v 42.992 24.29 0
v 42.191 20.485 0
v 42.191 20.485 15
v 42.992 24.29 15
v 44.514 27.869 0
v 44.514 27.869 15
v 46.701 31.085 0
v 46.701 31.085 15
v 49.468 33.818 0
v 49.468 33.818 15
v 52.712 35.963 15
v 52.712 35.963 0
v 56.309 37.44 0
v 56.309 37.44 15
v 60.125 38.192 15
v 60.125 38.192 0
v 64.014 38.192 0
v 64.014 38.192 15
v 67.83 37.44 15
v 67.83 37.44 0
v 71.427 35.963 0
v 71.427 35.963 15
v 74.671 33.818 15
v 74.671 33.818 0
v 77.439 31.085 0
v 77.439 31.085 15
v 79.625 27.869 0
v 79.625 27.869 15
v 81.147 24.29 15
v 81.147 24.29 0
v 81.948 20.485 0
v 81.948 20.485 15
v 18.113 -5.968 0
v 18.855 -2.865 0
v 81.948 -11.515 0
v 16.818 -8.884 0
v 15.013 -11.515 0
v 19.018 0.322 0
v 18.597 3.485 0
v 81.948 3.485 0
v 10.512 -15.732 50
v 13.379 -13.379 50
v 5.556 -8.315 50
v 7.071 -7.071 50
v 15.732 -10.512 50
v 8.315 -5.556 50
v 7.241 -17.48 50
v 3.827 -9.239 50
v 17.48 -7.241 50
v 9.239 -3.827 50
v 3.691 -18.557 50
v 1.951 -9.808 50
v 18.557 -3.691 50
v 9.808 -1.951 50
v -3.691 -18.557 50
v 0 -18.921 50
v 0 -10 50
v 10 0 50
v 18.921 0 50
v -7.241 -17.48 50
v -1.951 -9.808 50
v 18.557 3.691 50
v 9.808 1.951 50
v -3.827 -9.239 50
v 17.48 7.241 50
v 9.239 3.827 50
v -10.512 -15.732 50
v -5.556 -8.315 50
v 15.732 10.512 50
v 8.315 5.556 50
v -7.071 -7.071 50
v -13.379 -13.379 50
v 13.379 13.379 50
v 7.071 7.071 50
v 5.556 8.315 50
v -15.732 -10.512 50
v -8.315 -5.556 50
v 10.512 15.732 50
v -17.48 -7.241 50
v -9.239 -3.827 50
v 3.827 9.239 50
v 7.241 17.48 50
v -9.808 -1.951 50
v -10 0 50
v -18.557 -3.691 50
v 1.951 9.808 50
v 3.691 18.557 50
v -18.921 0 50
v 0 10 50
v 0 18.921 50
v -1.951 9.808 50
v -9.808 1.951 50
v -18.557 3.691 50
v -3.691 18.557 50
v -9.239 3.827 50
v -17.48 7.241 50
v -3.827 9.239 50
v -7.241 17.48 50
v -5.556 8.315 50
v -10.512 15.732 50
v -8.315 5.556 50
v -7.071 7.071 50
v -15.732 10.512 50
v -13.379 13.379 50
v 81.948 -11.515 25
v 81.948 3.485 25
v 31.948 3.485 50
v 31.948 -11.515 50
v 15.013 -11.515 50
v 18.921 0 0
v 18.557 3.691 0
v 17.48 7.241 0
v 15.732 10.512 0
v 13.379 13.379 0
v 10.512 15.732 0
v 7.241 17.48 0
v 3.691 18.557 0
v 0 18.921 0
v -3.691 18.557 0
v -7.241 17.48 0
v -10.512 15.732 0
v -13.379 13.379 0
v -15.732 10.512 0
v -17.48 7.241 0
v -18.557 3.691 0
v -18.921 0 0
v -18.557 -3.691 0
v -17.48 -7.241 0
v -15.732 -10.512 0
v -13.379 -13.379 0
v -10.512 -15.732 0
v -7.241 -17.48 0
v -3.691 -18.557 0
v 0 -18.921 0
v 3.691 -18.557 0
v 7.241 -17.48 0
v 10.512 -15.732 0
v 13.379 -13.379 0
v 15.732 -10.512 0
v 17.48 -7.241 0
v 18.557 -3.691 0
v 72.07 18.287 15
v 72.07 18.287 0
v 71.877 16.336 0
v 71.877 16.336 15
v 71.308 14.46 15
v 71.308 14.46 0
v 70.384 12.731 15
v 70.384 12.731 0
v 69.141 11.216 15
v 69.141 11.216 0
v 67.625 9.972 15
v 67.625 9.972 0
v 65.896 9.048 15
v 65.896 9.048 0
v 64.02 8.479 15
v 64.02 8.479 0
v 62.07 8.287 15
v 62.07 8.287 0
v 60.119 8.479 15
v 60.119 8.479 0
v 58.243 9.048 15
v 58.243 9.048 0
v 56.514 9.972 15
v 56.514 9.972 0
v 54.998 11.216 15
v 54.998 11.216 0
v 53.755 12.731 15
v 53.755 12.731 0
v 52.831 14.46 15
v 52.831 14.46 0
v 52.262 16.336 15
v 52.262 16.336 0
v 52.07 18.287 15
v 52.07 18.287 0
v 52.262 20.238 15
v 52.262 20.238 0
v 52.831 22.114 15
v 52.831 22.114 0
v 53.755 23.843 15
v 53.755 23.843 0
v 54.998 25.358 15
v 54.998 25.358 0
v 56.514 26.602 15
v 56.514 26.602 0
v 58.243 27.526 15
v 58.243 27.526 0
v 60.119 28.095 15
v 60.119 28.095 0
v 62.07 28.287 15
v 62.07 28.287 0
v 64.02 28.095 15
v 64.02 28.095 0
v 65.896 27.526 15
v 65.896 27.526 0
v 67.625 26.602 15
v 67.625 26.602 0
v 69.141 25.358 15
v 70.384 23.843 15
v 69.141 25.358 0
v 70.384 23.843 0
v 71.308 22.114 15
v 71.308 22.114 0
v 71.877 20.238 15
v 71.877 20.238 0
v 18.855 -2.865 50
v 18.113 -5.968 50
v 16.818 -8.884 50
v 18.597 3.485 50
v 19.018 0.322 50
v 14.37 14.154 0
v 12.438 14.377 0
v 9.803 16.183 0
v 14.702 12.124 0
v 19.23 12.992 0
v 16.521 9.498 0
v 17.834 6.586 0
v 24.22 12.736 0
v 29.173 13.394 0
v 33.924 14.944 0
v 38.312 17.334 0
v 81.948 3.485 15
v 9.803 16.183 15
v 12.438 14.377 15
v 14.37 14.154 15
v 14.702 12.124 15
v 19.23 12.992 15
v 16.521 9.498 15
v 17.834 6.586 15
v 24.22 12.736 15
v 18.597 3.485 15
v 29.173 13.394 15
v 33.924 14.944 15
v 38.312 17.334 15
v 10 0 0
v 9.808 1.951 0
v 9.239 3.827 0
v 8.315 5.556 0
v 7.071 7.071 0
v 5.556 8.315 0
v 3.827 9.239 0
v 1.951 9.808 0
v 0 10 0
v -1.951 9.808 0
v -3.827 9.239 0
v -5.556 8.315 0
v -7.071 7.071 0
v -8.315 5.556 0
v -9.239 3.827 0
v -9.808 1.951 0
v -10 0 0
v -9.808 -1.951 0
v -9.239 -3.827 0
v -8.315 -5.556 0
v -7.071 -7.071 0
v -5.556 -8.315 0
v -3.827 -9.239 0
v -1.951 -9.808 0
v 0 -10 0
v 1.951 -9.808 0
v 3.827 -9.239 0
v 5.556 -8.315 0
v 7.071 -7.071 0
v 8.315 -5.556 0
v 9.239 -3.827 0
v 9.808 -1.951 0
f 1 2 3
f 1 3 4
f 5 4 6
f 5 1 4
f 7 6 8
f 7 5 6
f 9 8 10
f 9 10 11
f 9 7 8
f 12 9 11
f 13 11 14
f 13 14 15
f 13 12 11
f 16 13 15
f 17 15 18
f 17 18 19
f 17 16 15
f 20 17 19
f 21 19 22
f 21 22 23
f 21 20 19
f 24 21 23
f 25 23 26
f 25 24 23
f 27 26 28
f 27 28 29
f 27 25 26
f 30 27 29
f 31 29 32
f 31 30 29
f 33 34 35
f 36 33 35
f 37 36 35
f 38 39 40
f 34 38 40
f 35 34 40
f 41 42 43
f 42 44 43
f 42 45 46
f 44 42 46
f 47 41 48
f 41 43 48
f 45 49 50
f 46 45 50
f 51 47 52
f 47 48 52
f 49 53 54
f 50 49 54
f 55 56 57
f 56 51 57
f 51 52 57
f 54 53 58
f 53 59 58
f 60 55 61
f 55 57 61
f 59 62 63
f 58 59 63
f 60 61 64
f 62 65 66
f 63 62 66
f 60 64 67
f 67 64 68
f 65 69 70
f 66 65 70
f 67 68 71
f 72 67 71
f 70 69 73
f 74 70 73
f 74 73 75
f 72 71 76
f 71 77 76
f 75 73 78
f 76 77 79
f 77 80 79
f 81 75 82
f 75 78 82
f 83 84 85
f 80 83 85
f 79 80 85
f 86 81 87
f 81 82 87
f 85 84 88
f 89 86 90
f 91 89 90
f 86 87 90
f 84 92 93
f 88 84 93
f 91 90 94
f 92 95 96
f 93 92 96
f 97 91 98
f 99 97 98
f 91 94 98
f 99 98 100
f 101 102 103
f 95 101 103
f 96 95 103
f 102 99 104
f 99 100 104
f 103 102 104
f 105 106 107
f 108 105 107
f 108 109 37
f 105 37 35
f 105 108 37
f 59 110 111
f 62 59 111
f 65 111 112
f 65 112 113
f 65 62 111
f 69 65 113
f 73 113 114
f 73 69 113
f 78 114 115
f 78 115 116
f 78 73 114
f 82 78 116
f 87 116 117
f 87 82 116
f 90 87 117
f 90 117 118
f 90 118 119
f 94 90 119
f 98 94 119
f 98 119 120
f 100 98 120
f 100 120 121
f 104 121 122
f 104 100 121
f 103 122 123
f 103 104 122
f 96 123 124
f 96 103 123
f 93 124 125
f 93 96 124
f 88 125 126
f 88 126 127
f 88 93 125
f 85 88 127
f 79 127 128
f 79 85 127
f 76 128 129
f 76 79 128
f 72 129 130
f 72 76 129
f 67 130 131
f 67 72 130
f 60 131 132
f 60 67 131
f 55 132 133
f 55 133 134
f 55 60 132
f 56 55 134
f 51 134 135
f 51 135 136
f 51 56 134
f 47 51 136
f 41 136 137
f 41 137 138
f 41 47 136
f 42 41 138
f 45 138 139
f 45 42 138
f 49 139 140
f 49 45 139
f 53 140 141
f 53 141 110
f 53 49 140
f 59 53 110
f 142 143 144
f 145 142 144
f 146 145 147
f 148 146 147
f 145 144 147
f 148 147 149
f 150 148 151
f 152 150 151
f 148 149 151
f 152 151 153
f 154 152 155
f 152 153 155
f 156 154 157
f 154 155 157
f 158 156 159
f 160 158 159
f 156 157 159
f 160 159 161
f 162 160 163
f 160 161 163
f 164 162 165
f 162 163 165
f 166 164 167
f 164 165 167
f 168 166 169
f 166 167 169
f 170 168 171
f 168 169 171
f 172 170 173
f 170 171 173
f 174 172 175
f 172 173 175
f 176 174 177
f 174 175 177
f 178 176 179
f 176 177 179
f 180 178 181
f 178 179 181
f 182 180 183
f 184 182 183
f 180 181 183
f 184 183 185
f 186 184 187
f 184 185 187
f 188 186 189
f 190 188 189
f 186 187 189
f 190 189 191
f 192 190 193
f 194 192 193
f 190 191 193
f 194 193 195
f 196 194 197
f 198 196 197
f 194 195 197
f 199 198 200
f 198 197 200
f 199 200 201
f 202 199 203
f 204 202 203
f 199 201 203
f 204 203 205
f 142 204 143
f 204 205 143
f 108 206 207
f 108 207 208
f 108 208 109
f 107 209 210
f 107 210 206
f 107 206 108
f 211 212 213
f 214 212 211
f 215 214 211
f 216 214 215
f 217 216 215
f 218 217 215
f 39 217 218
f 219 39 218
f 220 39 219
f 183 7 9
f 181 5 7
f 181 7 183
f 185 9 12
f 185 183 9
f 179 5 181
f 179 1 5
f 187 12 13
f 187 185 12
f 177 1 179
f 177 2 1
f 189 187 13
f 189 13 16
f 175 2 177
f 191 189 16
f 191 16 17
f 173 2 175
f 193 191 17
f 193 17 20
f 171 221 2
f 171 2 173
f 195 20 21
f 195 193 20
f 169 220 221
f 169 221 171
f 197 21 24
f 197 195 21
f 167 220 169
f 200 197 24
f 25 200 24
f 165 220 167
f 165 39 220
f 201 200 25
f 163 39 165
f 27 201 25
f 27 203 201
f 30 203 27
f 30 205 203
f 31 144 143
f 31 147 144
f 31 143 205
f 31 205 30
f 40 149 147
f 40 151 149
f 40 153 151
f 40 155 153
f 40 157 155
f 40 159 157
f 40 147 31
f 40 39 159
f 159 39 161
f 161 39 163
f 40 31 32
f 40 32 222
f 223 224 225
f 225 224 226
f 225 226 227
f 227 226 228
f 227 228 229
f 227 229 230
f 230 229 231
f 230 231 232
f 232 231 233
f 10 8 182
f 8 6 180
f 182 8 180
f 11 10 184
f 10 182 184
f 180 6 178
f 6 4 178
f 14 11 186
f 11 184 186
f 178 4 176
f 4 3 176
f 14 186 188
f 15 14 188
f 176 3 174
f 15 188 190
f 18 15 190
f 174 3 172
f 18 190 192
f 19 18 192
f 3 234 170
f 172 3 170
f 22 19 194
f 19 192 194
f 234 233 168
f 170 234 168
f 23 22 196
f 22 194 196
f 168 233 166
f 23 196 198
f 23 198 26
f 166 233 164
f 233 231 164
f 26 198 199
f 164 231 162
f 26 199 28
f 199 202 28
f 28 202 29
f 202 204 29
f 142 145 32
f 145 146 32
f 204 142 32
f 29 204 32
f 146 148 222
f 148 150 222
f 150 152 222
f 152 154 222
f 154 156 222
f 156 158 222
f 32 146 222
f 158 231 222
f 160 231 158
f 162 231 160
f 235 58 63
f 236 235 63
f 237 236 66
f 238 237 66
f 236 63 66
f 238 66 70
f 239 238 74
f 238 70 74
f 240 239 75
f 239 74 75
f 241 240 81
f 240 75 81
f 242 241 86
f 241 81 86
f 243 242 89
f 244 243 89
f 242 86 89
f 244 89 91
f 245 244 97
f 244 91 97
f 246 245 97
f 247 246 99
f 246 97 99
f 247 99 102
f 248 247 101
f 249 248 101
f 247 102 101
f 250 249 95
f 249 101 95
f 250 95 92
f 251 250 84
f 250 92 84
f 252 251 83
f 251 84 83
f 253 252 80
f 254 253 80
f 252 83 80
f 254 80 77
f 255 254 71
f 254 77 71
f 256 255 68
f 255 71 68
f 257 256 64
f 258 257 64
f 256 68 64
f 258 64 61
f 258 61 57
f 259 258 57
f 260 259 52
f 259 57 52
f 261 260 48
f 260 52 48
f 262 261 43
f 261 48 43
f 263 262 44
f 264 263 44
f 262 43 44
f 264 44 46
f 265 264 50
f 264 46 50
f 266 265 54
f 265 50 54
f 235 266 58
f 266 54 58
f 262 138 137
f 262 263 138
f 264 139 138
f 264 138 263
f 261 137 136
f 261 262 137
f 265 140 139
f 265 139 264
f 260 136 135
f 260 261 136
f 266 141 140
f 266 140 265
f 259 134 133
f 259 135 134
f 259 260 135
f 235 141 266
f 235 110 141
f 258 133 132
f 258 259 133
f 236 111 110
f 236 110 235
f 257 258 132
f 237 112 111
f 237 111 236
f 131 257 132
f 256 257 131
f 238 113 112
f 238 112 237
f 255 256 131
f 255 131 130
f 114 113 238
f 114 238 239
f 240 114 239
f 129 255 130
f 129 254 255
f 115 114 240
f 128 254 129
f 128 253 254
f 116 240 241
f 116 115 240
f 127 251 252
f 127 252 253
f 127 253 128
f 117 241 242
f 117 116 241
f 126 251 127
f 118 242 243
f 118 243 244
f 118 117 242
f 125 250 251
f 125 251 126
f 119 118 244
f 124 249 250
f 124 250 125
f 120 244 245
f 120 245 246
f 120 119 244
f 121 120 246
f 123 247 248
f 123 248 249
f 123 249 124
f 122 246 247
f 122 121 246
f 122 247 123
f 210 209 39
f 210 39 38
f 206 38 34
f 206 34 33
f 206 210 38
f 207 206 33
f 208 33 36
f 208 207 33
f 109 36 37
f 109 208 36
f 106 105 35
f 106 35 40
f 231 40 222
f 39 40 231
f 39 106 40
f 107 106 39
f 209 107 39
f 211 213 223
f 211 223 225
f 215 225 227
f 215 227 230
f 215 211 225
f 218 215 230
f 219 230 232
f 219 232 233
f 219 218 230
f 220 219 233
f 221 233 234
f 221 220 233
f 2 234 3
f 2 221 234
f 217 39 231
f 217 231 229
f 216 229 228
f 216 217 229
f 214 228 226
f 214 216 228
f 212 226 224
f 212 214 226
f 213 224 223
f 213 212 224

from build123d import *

# Parameters (mm, degrees)
F0_W      = 18.920604
F0_H      = 50
F2_R      = 10
F3_DEPTH  = 50
F5_DEPTH  = 50
F7_DEPTH  = 15
F9_DEPTH  = 15
F10_R     = 10
F11_DEPTH = 15


with BuildPart() as f1:
    # F0 (on Front) → F1 (revolve)
    with BuildSketch(Plane.XZ):
        with Locations((9.460302, 25)):
            Rectangle(F0_W, F0_H)
    revolve(axis=Axis((0, 0, 25), (0, 0, 1)))

    # F2 (on face) → F3 (cut)
    with BuildSketch(Plane.XY.offset(50)):
        Circle(F2_R)
    extrude(amount=-F3_DEPTH, mode=Mode.SUBTRACT)


with BuildPart() as f5:
    # F4 (on face) → F5 (new body)
    with BuildSketch(Plane.XY.offset(50)):
        with BuildLine():
            Line((81.948414, 3.484557), (18.596966, 3.484557))
            ThreePointArc((18.596966, 3.484557), (18.555036, -4.433635), (15.012789, -11.515443))
            Line((15.012789, -11.515443), (81.948414, -11.515443))
            Line((81.948414, -11.515443), (81.948414, 3.484557))
        make_face()
    extrude(amount=-F5_DEPTH)

    # F6 (on face) → F7 (cut)
    with BuildSketch(Plane(origin=(0, 3.484557, 0), x_dir=(-1, 0, 0), z_dir=(0, 1, 0))):
        Polygon((-81.948414, 25), (-31.948414, 50), (-81.948414, 50), align=None)
    extrude(amount=-F7_DEPTH, mode=Mode.SUBTRACT)


with BuildPart() as f9:
    # F8 (on face) → F9 (new body)
    with BuildSketch(Plane(origin=(0, 0, 0), x_dir=(1, 0, 0), z_dir=(0, 0, -1))):
        with BuildLine():
            ThreePointArc((18.596966, -3.484557), (15.67145, -10.852523), (9.803409, -16.182782))
            ThreePointArc((9.803409, -16.182782), (26.711889, -12.951517), (42.190619, -20.484557))
            ThreePointArc((42.190619, -20.484557), (62.069517, -38.286961), (81.948414, -20.484557))
            Line((81.948414, -20.484557), (81.948414, -3.484557))
            Line((81.948414, -3.484557), (18.596966, -3.484557))
        make_face()
    extrude(amount=-F9_DEPTH)

    # F10 (on face) → F11 (cut)
    with BuildSketch(Plane(origin=(0, 0, 0), x_dir=(1, 0, 0), z_dir=(0, 0, -1))):
        with Locations((62.069517, -18.286961)):
            Circle(F10_R)
    extrude(amount=-F11_DEPTH, mode=Mode.SUBTRACT)


solid = Compound([f1.part, f5.part, f9.part])
